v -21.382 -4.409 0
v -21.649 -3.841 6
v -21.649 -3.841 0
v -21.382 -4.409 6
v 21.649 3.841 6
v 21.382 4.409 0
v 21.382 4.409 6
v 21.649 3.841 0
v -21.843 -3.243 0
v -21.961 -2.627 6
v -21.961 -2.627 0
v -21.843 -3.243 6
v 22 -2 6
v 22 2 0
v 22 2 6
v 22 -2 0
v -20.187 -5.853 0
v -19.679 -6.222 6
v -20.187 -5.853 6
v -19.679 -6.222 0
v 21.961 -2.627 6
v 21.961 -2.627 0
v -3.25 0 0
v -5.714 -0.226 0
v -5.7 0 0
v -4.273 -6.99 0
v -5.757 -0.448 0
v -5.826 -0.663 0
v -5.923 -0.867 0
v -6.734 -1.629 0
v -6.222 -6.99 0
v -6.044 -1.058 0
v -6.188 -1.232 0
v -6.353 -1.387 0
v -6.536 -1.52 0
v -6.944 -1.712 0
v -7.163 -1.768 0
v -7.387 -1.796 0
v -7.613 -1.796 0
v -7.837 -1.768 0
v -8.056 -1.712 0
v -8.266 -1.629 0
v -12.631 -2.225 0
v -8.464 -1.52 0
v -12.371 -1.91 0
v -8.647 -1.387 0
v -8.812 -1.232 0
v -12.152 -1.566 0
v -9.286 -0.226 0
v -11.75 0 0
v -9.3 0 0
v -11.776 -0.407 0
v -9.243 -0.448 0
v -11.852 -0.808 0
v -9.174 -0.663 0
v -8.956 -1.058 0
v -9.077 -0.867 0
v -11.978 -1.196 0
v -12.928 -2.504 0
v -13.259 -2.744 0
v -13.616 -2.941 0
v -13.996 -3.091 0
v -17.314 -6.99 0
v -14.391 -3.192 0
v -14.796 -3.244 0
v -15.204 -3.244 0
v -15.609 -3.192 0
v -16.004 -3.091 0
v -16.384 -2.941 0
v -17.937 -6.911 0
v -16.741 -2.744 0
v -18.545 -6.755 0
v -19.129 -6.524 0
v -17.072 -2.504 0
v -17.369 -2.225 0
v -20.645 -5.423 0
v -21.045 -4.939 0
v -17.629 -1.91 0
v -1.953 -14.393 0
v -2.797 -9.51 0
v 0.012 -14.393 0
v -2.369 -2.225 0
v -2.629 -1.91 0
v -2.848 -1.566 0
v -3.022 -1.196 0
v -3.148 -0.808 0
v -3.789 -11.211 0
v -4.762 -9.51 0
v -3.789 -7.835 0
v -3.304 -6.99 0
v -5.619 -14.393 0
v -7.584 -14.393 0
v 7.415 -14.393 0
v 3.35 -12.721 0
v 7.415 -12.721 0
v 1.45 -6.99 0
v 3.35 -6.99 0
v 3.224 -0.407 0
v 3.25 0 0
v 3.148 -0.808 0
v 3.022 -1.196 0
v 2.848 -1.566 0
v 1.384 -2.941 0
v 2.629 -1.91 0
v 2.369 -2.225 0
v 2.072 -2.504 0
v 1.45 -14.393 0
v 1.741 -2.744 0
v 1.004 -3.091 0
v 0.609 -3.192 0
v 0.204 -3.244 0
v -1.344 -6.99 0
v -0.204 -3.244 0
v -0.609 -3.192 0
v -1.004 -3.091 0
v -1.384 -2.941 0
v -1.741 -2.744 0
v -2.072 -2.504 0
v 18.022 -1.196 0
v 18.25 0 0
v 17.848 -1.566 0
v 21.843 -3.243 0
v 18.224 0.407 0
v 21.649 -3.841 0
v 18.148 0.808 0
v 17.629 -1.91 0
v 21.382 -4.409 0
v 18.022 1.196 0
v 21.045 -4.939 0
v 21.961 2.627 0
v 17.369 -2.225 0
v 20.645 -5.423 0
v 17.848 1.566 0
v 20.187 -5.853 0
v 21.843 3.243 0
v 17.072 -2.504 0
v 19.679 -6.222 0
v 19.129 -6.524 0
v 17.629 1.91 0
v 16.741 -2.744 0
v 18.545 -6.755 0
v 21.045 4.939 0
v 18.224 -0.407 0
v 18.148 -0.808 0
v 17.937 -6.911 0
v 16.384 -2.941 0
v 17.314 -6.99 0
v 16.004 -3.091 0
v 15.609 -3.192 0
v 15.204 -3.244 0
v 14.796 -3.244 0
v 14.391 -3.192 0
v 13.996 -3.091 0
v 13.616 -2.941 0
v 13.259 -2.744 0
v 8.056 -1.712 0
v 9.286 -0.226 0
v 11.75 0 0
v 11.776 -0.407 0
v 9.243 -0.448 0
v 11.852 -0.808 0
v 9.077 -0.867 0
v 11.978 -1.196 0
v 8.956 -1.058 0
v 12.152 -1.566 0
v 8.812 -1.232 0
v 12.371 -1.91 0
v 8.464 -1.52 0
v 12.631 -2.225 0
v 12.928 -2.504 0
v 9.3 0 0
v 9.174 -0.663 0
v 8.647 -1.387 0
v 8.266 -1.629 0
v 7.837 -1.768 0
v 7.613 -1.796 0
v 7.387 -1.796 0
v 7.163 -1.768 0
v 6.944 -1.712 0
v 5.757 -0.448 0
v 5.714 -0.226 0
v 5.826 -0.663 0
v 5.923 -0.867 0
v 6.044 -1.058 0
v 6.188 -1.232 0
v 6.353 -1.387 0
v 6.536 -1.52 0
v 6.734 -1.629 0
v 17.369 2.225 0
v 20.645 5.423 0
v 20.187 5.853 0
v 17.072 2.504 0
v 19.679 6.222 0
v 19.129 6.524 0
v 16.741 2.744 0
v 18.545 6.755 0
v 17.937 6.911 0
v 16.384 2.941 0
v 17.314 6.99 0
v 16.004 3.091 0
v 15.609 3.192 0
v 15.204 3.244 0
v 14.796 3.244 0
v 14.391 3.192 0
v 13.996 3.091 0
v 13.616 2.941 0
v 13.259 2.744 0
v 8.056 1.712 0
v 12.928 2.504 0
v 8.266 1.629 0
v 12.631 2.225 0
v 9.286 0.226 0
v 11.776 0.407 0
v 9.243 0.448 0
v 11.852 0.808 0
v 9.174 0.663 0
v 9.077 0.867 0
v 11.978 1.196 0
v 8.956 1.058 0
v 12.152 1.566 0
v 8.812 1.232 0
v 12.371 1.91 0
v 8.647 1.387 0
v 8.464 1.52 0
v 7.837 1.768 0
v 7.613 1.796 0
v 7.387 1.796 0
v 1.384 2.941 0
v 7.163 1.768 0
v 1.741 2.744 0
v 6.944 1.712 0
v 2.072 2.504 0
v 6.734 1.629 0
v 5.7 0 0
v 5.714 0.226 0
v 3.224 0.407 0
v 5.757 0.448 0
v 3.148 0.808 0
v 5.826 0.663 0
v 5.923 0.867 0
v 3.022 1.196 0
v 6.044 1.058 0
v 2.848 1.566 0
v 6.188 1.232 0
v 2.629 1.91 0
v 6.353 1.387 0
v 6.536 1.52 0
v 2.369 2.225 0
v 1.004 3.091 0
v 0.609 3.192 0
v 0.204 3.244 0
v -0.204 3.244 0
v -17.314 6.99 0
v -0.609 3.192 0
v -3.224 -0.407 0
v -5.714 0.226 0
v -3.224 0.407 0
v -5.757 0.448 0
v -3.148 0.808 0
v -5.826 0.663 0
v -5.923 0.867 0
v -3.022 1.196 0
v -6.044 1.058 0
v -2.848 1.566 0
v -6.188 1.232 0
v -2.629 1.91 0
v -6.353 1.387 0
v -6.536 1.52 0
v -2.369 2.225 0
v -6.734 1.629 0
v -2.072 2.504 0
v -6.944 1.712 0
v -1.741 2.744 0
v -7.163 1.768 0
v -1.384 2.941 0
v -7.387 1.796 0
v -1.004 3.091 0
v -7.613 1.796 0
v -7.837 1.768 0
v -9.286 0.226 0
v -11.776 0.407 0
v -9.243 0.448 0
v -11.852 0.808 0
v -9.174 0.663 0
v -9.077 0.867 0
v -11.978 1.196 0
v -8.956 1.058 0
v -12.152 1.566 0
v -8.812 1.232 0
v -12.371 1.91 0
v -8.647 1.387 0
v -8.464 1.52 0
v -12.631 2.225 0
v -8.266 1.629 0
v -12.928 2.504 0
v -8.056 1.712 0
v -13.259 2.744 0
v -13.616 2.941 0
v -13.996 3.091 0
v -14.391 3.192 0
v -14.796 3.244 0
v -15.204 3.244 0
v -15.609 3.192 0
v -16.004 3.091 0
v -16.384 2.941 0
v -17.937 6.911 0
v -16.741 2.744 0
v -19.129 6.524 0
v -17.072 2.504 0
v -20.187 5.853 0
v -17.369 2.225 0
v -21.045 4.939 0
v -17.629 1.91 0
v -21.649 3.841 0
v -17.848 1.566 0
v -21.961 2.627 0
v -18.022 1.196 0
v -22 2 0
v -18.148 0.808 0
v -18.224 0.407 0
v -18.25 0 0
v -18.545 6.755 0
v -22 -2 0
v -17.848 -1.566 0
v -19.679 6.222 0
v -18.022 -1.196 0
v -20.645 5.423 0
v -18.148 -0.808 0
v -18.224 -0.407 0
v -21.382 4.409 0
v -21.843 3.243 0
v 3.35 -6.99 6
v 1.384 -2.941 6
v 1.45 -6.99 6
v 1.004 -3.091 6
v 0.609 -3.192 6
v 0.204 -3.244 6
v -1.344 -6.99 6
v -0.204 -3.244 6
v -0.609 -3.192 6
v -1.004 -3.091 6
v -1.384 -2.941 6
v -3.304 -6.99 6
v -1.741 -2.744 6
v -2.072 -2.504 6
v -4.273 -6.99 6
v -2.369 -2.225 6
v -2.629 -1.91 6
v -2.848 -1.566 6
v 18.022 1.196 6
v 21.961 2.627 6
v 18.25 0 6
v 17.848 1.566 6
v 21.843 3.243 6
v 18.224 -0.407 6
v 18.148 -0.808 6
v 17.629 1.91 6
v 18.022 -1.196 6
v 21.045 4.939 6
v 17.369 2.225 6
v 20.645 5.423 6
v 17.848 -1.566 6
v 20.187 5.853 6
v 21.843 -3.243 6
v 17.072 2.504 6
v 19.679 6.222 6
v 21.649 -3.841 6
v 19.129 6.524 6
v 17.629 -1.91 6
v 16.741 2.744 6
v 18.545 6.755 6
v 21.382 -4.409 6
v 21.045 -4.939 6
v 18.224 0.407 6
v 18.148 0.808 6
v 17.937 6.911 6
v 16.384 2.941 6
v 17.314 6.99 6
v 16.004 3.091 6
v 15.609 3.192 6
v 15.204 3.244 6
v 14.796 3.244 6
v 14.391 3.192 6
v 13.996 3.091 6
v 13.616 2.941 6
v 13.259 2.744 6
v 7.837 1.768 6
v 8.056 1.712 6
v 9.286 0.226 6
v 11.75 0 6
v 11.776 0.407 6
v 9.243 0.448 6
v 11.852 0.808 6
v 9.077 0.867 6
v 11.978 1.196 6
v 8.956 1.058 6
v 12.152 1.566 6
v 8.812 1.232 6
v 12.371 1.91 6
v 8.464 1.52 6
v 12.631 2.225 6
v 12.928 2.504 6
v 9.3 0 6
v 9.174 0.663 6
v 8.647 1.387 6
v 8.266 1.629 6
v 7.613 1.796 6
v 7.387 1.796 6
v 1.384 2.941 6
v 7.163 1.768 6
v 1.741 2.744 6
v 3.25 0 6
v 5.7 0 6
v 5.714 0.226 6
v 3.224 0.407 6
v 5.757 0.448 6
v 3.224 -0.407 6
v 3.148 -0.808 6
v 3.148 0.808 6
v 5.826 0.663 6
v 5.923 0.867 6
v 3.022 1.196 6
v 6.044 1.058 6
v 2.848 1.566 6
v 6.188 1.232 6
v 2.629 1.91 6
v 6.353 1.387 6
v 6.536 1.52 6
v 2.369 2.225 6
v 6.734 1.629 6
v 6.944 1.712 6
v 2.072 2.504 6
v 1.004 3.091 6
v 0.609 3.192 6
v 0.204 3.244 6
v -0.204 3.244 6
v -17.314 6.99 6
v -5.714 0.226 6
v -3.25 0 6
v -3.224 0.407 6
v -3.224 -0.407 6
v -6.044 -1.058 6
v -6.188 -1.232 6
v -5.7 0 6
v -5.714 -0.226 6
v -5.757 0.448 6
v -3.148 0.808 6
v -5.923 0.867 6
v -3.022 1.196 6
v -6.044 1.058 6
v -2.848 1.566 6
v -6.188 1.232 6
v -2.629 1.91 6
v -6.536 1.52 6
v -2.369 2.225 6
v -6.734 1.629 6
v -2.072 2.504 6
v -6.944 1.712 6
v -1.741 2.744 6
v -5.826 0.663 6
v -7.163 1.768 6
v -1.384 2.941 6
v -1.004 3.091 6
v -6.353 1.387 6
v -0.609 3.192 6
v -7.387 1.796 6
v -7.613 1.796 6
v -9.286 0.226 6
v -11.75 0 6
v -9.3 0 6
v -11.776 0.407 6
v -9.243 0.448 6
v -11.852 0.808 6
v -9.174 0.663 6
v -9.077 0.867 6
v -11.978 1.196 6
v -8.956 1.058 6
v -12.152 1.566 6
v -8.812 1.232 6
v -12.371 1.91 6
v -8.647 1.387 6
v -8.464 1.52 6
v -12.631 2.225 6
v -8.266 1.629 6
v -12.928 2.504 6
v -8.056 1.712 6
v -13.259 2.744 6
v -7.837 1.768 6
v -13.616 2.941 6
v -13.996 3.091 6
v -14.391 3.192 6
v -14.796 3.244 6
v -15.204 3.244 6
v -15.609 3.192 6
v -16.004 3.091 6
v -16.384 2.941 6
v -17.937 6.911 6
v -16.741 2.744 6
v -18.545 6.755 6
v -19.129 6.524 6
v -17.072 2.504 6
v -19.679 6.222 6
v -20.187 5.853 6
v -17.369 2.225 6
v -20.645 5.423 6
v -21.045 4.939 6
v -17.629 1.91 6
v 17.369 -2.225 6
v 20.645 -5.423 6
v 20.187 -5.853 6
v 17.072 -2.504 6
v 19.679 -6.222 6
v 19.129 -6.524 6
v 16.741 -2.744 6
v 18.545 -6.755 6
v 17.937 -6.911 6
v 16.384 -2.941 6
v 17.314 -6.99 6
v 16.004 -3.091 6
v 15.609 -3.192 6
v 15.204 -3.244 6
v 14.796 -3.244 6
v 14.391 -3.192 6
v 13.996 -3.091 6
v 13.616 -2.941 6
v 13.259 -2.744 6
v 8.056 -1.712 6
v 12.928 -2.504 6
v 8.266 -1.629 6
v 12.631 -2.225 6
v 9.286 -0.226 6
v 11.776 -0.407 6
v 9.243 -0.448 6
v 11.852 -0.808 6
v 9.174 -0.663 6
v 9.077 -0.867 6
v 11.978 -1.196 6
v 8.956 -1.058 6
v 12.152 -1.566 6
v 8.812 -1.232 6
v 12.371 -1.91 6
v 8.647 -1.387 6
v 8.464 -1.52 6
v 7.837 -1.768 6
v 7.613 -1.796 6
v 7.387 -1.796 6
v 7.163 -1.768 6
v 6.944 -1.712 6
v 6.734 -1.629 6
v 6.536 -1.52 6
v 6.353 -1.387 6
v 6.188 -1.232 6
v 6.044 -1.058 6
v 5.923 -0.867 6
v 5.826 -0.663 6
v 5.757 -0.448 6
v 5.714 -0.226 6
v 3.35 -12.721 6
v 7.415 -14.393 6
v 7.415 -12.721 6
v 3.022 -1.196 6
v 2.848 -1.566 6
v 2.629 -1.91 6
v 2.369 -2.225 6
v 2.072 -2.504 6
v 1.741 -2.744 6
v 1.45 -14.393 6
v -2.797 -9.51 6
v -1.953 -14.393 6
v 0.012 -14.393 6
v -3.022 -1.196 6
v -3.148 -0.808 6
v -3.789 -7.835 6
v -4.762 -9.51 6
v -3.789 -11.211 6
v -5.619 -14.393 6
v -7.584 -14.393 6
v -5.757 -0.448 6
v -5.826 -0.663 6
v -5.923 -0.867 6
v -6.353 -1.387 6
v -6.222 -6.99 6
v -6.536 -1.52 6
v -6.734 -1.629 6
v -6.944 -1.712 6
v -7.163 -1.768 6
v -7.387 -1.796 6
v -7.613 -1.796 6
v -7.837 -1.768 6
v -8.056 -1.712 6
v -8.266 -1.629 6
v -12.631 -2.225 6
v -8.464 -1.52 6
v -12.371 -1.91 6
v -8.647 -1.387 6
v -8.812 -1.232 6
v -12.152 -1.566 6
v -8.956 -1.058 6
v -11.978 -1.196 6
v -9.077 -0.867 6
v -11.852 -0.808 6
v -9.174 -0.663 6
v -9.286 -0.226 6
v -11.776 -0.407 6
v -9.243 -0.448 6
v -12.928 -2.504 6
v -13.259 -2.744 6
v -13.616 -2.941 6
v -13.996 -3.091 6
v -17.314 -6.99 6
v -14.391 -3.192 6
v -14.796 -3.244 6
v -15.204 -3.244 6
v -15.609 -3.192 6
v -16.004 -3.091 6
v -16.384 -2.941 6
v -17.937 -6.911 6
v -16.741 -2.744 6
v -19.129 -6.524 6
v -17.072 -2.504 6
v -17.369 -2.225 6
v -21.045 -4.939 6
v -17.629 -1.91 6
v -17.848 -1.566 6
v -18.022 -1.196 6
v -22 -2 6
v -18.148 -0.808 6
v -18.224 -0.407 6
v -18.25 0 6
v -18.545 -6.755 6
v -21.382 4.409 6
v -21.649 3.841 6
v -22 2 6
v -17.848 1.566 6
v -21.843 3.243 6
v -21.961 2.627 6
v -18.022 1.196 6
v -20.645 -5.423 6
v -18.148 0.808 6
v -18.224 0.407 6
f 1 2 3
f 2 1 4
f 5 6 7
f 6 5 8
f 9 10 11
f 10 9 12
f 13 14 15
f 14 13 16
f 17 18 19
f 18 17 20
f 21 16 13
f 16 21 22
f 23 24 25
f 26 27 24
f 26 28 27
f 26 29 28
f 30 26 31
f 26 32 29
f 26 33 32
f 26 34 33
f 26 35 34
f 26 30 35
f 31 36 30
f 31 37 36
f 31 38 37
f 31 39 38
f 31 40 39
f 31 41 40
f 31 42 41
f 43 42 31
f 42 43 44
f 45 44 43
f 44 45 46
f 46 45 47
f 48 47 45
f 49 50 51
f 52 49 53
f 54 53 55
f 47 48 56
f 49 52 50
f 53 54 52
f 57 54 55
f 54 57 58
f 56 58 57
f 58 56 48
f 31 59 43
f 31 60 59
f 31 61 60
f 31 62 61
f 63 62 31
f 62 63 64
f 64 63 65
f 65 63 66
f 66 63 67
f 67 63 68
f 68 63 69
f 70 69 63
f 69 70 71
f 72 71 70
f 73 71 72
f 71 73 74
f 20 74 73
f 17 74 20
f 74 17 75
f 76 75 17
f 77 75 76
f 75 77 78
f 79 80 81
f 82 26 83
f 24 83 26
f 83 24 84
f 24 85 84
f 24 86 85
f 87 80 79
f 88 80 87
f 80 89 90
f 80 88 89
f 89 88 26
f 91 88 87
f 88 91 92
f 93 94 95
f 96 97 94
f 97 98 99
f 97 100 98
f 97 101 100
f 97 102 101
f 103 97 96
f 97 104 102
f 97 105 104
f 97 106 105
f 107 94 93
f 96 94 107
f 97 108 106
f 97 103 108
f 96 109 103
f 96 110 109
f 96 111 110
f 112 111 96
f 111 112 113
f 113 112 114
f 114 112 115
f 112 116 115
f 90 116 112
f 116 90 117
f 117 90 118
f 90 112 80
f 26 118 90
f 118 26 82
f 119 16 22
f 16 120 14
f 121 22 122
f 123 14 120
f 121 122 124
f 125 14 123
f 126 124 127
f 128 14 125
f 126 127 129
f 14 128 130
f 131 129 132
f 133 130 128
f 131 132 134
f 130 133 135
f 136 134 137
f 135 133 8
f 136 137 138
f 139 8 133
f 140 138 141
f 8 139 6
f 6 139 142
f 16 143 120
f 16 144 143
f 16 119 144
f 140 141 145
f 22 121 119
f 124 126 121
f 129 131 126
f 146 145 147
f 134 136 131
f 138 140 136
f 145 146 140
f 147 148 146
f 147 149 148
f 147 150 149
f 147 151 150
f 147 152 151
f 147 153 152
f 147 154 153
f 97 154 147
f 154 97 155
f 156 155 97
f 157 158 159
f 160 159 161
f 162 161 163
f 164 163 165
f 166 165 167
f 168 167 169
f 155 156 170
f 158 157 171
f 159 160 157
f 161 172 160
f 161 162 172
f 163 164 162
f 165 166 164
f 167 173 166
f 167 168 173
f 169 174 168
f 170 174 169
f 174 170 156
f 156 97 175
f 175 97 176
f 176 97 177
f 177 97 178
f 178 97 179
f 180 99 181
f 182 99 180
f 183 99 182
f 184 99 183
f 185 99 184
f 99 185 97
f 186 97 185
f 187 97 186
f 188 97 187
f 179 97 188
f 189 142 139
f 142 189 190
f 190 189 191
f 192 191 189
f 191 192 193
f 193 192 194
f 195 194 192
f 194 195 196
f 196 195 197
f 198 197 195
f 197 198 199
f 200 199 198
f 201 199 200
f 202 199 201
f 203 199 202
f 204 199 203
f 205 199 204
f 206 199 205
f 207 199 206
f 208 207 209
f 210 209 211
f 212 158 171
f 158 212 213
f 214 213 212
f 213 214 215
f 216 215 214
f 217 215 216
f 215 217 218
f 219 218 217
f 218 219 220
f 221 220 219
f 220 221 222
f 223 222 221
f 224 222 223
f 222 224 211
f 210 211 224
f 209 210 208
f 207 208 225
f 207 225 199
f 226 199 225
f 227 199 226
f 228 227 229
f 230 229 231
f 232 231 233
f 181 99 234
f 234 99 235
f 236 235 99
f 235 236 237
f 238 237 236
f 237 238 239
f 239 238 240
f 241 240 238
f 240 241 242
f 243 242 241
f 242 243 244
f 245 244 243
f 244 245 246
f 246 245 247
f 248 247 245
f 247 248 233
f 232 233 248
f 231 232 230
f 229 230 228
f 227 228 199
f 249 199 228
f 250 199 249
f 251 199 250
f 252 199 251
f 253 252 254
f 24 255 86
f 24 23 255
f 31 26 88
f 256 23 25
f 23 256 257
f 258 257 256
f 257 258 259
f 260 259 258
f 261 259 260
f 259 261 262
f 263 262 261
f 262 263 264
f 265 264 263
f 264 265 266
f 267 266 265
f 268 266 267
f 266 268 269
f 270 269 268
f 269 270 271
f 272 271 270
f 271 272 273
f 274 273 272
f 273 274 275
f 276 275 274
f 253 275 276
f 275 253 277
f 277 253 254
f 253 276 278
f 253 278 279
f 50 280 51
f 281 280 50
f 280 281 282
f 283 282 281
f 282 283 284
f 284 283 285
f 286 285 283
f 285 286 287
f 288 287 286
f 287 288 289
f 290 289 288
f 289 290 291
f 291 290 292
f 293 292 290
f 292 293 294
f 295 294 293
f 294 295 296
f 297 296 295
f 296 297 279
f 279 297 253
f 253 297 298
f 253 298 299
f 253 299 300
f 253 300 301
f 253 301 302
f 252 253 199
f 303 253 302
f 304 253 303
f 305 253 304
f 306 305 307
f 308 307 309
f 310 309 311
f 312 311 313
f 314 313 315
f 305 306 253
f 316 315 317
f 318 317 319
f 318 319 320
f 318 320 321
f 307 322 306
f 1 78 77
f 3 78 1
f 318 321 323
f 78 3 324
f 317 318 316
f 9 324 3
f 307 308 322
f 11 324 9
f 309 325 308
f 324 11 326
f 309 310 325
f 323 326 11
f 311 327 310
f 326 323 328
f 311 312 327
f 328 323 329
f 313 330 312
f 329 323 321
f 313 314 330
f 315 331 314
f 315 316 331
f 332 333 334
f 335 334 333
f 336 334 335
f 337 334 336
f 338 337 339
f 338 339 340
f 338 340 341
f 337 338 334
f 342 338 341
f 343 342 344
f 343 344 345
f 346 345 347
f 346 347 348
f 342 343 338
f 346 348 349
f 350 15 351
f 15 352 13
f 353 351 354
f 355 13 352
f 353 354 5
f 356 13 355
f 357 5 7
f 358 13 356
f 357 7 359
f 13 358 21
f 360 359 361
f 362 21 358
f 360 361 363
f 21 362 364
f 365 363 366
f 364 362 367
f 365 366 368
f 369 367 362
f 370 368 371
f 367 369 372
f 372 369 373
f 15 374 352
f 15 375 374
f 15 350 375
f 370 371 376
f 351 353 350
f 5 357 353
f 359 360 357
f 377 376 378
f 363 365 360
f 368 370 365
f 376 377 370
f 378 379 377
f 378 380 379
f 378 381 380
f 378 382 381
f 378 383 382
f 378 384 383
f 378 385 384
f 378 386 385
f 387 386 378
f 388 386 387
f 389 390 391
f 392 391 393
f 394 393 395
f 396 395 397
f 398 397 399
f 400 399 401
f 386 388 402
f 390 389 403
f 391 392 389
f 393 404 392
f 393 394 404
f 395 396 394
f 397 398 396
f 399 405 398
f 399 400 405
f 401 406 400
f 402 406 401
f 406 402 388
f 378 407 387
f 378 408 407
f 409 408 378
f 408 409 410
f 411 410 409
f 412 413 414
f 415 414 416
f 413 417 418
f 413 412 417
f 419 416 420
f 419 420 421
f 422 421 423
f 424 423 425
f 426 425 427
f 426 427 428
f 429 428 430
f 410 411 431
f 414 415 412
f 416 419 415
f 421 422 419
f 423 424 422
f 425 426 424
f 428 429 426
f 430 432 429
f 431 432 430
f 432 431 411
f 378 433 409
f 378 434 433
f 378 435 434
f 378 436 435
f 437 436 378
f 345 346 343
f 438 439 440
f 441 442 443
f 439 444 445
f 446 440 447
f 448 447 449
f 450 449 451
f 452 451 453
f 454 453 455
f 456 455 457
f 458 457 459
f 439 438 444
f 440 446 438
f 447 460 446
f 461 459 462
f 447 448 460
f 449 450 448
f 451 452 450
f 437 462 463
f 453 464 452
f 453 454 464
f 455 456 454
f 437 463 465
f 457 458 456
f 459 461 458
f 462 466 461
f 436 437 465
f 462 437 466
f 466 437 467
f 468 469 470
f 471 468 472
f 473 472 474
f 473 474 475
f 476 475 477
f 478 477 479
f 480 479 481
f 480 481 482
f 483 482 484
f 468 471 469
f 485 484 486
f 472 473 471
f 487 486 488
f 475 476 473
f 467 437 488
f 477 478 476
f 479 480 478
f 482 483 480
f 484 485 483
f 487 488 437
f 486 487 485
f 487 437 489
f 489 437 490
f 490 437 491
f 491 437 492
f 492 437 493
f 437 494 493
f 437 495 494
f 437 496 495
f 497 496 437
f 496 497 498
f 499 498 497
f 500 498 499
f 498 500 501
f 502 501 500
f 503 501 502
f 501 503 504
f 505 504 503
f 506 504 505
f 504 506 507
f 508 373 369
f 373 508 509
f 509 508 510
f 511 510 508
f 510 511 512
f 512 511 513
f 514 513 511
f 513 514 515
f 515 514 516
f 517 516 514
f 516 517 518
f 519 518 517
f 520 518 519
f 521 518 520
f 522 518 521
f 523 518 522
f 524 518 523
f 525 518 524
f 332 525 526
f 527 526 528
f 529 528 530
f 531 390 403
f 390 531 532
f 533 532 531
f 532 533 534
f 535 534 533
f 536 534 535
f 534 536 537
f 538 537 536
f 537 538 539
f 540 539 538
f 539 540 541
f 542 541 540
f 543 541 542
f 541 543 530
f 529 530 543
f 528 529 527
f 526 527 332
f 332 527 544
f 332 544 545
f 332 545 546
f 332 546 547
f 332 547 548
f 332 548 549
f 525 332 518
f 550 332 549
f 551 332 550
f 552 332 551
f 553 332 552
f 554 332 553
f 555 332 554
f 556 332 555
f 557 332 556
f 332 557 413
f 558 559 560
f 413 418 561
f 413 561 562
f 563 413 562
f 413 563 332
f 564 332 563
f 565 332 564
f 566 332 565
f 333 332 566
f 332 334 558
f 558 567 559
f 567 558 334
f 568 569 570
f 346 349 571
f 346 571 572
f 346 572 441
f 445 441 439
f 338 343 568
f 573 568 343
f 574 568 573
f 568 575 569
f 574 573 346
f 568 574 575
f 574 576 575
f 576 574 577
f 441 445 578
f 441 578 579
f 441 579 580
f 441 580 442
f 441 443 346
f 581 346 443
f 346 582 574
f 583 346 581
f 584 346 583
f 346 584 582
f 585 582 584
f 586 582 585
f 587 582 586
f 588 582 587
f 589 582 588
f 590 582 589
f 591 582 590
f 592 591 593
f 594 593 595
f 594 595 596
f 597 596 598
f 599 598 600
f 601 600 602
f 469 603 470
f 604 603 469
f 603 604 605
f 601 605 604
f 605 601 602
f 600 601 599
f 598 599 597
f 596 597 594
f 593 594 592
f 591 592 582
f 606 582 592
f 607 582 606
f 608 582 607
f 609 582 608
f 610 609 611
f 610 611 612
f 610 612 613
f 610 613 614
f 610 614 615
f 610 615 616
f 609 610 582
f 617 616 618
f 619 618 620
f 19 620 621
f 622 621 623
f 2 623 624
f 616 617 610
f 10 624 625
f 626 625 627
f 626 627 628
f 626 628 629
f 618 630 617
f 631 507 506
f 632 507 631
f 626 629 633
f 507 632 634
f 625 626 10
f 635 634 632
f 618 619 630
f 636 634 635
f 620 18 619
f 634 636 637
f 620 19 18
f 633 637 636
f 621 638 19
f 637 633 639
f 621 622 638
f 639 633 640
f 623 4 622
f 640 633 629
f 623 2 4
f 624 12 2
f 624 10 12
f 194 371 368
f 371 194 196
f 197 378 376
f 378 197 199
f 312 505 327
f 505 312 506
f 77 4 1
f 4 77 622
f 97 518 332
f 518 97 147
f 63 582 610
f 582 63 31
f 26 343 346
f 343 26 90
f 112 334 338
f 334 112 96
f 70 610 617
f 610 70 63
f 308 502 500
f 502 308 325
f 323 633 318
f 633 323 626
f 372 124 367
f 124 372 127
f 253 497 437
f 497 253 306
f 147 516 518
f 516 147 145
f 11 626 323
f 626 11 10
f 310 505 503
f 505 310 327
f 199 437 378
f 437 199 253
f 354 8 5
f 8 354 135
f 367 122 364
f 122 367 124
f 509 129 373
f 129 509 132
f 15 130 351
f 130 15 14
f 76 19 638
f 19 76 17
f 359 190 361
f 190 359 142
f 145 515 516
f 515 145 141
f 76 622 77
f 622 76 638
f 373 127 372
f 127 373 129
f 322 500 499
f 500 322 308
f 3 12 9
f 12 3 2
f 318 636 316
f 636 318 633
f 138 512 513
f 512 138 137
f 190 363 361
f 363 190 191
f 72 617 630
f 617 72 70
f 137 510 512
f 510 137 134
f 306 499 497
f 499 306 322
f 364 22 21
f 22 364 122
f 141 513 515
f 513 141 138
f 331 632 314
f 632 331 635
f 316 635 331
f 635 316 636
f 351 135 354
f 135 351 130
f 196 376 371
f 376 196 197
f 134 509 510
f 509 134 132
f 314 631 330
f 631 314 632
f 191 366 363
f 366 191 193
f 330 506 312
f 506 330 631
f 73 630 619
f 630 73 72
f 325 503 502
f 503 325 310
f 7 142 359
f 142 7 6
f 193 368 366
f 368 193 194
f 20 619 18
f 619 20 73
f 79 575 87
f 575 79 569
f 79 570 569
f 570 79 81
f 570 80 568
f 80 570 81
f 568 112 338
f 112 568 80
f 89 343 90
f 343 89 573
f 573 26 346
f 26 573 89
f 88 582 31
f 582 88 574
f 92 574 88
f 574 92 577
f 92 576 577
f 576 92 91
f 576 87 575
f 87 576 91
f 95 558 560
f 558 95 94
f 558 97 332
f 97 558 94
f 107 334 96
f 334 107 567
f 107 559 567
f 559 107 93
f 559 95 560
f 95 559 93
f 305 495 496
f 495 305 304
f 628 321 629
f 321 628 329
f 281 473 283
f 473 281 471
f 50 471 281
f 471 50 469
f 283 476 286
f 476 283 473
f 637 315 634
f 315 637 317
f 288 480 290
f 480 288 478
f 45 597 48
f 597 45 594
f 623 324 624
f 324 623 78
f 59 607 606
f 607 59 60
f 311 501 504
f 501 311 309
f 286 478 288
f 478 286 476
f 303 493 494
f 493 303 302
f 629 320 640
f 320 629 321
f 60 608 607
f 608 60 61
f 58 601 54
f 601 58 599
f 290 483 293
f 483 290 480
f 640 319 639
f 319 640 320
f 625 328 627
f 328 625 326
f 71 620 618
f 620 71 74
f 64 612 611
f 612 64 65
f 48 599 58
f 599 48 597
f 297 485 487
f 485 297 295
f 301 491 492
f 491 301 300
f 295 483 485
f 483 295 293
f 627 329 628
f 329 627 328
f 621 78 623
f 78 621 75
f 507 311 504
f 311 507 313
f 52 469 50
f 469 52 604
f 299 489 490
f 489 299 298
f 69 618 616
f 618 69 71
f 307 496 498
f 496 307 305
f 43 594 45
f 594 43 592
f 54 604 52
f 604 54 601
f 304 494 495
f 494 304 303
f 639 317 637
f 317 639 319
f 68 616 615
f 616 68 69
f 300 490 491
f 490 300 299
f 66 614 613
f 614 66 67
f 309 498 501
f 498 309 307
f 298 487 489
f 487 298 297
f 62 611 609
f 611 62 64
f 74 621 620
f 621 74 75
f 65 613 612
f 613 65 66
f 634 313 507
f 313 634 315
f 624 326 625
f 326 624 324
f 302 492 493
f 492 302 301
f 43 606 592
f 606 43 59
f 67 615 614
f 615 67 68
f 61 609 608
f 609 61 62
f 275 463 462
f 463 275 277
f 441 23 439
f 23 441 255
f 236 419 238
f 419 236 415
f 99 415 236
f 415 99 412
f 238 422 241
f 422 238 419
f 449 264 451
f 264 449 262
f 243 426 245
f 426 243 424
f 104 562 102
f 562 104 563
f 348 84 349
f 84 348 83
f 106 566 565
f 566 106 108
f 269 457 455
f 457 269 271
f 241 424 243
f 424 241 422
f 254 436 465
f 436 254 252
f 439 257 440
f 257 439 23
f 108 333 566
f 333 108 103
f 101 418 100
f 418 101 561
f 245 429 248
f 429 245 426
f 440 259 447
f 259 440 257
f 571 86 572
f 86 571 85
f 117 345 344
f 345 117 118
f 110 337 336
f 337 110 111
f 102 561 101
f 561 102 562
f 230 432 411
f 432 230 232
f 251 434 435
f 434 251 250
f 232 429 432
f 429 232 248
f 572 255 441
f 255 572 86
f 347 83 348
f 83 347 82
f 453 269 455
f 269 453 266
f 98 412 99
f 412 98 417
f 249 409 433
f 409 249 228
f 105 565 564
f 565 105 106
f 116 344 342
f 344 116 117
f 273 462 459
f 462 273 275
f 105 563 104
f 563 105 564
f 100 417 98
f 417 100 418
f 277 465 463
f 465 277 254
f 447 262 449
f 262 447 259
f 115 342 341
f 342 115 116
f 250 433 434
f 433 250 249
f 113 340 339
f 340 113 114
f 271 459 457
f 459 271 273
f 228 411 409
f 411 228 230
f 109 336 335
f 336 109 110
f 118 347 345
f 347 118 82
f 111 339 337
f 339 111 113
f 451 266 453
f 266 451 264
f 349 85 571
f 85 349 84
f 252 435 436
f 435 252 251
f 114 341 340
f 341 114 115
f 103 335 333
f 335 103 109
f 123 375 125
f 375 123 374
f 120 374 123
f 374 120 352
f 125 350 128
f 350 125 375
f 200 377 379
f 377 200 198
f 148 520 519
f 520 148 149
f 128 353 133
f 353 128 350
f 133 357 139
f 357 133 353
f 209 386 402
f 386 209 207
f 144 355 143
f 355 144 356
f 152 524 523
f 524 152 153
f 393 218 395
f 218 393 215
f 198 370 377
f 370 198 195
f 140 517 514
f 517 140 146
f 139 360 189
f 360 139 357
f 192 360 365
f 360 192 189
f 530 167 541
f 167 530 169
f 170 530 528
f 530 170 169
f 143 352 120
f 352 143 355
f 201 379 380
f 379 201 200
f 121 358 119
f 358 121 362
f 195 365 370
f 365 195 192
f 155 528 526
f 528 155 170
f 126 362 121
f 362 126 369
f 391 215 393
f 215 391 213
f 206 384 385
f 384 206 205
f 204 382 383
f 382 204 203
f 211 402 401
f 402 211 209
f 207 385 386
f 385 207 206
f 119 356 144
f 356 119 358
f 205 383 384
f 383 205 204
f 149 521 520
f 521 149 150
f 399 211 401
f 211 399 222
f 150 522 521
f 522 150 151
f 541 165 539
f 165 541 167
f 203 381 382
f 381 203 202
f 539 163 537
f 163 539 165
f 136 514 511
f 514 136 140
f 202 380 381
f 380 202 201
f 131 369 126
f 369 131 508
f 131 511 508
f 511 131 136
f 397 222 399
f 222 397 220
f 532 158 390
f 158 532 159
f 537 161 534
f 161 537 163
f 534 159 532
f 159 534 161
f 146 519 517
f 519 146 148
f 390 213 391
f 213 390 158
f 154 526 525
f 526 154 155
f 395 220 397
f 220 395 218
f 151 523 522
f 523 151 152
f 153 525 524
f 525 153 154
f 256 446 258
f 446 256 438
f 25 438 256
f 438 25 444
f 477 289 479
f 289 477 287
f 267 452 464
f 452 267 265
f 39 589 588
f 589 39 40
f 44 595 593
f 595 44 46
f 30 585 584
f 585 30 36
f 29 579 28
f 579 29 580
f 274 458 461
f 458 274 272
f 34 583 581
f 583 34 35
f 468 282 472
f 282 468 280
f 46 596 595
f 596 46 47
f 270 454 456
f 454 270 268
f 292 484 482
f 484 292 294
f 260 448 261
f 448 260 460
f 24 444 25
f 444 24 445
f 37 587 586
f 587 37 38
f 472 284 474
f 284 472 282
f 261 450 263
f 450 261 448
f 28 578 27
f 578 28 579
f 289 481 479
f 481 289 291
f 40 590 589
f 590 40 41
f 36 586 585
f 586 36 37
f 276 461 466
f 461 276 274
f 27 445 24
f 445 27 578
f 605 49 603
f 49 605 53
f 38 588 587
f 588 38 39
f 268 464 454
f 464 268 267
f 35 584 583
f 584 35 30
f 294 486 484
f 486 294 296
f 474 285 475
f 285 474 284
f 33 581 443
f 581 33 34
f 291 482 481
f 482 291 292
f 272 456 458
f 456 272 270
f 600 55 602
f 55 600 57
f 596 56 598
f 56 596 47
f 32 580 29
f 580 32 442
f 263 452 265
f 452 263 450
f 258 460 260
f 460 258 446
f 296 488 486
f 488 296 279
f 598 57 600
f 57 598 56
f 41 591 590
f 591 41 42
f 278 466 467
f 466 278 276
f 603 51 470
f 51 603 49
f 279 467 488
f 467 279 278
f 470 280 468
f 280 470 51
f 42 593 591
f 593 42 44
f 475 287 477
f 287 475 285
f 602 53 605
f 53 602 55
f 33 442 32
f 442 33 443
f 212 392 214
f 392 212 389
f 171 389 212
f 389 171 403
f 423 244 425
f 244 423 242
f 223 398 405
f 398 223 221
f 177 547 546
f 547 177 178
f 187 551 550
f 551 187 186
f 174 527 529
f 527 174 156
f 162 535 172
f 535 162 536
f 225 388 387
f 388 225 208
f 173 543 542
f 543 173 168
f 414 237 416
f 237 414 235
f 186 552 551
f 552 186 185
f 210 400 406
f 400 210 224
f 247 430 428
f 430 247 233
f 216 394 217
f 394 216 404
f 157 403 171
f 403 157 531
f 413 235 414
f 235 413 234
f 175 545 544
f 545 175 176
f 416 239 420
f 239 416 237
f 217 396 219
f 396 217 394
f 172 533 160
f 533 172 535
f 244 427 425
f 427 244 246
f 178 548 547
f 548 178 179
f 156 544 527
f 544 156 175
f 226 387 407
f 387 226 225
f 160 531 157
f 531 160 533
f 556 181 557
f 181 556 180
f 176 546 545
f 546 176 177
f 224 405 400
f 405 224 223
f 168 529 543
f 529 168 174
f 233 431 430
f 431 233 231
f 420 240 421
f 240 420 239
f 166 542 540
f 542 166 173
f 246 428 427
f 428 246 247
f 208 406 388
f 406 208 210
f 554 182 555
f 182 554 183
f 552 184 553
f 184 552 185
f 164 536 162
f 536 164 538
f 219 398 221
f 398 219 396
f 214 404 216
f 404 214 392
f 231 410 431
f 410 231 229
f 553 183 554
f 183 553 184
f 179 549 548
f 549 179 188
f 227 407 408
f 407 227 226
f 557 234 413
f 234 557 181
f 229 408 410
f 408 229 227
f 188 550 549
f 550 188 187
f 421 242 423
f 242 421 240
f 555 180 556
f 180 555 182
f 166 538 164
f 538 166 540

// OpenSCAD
$fn = 50;


difference() {
	union() {
		hull() {
			translate(v = [-17.0000000000, 2.0000000000, 0]) {
				cylinder(h = 6, r = 5);
			}
			translate(v = [17.0000000000, 2.0000000000, 0]) {
				cylinder(h = 6, r = 5);
			}
			translate(v = [-17.0000000000, -2.0000000000, 0]) {
				cylinder(h = 6, r = 5);
			}
			translate(v = [17.0000000000, -2.0000000000, 0]) {
				cylinder(h = 6, r = 5);
			}
		}
		translate(v = [0, -5, 0]) {
			linear_extrude(height = 6) {
				text(font = "DejaVu Sans Mono:style=Bold", halign = "center", size = 9.5000000000, text = "XL", valign = "top");
			}
		}
	}
	union() {
		translate(v = [-15.0000000000, 0.0000000000, 0]) {
			translate(v = [0, 0, -100]) {
				cylinder(h = 200, r = 3.2500000000);
			}
		}
		translate(v = [0, 0, -100]) {
			cylinder(h = 200, r = 3.2500000000);
		}
		translate(v = [15.0000000000, 0.0000000000, 0]) {
			translate(v = [0, 0, -100]) {
				cylinder(h = 200, r = 3.2500000000);
			}
		}
		translate(v = [-15.0000000000, 0.0000000000, 0]) {
			translate(v = [0, 0, -100]) {
				cylinder(h = 200, r = 1.8000000000);
			}
		}
		translate(v = [-7.5000000000, 0.0000000000, 0]) {
			translate(v = [0, 0, -100]) {
				cylinder(h = 200, r = 1.8000000000);
			}
		}
		translate(v = [0, 0, -100]) {
			cylinder(h = 200, r = 1.8000000000);
		}
		translate(v = [7.5000000000, 0.0000000000, 0]) {
			translate(v = [0, 0, -100]) {
				cylinder(h = 200, r = 1.8000000000);
			}
		}
		translate(v = [15.0000000000, 0.0000000000, 0]) {
			translate(v = [0, 0, -100]) {
				cylinder(h = 200, r = 1.8000000000);
			}
		}
	}
}
